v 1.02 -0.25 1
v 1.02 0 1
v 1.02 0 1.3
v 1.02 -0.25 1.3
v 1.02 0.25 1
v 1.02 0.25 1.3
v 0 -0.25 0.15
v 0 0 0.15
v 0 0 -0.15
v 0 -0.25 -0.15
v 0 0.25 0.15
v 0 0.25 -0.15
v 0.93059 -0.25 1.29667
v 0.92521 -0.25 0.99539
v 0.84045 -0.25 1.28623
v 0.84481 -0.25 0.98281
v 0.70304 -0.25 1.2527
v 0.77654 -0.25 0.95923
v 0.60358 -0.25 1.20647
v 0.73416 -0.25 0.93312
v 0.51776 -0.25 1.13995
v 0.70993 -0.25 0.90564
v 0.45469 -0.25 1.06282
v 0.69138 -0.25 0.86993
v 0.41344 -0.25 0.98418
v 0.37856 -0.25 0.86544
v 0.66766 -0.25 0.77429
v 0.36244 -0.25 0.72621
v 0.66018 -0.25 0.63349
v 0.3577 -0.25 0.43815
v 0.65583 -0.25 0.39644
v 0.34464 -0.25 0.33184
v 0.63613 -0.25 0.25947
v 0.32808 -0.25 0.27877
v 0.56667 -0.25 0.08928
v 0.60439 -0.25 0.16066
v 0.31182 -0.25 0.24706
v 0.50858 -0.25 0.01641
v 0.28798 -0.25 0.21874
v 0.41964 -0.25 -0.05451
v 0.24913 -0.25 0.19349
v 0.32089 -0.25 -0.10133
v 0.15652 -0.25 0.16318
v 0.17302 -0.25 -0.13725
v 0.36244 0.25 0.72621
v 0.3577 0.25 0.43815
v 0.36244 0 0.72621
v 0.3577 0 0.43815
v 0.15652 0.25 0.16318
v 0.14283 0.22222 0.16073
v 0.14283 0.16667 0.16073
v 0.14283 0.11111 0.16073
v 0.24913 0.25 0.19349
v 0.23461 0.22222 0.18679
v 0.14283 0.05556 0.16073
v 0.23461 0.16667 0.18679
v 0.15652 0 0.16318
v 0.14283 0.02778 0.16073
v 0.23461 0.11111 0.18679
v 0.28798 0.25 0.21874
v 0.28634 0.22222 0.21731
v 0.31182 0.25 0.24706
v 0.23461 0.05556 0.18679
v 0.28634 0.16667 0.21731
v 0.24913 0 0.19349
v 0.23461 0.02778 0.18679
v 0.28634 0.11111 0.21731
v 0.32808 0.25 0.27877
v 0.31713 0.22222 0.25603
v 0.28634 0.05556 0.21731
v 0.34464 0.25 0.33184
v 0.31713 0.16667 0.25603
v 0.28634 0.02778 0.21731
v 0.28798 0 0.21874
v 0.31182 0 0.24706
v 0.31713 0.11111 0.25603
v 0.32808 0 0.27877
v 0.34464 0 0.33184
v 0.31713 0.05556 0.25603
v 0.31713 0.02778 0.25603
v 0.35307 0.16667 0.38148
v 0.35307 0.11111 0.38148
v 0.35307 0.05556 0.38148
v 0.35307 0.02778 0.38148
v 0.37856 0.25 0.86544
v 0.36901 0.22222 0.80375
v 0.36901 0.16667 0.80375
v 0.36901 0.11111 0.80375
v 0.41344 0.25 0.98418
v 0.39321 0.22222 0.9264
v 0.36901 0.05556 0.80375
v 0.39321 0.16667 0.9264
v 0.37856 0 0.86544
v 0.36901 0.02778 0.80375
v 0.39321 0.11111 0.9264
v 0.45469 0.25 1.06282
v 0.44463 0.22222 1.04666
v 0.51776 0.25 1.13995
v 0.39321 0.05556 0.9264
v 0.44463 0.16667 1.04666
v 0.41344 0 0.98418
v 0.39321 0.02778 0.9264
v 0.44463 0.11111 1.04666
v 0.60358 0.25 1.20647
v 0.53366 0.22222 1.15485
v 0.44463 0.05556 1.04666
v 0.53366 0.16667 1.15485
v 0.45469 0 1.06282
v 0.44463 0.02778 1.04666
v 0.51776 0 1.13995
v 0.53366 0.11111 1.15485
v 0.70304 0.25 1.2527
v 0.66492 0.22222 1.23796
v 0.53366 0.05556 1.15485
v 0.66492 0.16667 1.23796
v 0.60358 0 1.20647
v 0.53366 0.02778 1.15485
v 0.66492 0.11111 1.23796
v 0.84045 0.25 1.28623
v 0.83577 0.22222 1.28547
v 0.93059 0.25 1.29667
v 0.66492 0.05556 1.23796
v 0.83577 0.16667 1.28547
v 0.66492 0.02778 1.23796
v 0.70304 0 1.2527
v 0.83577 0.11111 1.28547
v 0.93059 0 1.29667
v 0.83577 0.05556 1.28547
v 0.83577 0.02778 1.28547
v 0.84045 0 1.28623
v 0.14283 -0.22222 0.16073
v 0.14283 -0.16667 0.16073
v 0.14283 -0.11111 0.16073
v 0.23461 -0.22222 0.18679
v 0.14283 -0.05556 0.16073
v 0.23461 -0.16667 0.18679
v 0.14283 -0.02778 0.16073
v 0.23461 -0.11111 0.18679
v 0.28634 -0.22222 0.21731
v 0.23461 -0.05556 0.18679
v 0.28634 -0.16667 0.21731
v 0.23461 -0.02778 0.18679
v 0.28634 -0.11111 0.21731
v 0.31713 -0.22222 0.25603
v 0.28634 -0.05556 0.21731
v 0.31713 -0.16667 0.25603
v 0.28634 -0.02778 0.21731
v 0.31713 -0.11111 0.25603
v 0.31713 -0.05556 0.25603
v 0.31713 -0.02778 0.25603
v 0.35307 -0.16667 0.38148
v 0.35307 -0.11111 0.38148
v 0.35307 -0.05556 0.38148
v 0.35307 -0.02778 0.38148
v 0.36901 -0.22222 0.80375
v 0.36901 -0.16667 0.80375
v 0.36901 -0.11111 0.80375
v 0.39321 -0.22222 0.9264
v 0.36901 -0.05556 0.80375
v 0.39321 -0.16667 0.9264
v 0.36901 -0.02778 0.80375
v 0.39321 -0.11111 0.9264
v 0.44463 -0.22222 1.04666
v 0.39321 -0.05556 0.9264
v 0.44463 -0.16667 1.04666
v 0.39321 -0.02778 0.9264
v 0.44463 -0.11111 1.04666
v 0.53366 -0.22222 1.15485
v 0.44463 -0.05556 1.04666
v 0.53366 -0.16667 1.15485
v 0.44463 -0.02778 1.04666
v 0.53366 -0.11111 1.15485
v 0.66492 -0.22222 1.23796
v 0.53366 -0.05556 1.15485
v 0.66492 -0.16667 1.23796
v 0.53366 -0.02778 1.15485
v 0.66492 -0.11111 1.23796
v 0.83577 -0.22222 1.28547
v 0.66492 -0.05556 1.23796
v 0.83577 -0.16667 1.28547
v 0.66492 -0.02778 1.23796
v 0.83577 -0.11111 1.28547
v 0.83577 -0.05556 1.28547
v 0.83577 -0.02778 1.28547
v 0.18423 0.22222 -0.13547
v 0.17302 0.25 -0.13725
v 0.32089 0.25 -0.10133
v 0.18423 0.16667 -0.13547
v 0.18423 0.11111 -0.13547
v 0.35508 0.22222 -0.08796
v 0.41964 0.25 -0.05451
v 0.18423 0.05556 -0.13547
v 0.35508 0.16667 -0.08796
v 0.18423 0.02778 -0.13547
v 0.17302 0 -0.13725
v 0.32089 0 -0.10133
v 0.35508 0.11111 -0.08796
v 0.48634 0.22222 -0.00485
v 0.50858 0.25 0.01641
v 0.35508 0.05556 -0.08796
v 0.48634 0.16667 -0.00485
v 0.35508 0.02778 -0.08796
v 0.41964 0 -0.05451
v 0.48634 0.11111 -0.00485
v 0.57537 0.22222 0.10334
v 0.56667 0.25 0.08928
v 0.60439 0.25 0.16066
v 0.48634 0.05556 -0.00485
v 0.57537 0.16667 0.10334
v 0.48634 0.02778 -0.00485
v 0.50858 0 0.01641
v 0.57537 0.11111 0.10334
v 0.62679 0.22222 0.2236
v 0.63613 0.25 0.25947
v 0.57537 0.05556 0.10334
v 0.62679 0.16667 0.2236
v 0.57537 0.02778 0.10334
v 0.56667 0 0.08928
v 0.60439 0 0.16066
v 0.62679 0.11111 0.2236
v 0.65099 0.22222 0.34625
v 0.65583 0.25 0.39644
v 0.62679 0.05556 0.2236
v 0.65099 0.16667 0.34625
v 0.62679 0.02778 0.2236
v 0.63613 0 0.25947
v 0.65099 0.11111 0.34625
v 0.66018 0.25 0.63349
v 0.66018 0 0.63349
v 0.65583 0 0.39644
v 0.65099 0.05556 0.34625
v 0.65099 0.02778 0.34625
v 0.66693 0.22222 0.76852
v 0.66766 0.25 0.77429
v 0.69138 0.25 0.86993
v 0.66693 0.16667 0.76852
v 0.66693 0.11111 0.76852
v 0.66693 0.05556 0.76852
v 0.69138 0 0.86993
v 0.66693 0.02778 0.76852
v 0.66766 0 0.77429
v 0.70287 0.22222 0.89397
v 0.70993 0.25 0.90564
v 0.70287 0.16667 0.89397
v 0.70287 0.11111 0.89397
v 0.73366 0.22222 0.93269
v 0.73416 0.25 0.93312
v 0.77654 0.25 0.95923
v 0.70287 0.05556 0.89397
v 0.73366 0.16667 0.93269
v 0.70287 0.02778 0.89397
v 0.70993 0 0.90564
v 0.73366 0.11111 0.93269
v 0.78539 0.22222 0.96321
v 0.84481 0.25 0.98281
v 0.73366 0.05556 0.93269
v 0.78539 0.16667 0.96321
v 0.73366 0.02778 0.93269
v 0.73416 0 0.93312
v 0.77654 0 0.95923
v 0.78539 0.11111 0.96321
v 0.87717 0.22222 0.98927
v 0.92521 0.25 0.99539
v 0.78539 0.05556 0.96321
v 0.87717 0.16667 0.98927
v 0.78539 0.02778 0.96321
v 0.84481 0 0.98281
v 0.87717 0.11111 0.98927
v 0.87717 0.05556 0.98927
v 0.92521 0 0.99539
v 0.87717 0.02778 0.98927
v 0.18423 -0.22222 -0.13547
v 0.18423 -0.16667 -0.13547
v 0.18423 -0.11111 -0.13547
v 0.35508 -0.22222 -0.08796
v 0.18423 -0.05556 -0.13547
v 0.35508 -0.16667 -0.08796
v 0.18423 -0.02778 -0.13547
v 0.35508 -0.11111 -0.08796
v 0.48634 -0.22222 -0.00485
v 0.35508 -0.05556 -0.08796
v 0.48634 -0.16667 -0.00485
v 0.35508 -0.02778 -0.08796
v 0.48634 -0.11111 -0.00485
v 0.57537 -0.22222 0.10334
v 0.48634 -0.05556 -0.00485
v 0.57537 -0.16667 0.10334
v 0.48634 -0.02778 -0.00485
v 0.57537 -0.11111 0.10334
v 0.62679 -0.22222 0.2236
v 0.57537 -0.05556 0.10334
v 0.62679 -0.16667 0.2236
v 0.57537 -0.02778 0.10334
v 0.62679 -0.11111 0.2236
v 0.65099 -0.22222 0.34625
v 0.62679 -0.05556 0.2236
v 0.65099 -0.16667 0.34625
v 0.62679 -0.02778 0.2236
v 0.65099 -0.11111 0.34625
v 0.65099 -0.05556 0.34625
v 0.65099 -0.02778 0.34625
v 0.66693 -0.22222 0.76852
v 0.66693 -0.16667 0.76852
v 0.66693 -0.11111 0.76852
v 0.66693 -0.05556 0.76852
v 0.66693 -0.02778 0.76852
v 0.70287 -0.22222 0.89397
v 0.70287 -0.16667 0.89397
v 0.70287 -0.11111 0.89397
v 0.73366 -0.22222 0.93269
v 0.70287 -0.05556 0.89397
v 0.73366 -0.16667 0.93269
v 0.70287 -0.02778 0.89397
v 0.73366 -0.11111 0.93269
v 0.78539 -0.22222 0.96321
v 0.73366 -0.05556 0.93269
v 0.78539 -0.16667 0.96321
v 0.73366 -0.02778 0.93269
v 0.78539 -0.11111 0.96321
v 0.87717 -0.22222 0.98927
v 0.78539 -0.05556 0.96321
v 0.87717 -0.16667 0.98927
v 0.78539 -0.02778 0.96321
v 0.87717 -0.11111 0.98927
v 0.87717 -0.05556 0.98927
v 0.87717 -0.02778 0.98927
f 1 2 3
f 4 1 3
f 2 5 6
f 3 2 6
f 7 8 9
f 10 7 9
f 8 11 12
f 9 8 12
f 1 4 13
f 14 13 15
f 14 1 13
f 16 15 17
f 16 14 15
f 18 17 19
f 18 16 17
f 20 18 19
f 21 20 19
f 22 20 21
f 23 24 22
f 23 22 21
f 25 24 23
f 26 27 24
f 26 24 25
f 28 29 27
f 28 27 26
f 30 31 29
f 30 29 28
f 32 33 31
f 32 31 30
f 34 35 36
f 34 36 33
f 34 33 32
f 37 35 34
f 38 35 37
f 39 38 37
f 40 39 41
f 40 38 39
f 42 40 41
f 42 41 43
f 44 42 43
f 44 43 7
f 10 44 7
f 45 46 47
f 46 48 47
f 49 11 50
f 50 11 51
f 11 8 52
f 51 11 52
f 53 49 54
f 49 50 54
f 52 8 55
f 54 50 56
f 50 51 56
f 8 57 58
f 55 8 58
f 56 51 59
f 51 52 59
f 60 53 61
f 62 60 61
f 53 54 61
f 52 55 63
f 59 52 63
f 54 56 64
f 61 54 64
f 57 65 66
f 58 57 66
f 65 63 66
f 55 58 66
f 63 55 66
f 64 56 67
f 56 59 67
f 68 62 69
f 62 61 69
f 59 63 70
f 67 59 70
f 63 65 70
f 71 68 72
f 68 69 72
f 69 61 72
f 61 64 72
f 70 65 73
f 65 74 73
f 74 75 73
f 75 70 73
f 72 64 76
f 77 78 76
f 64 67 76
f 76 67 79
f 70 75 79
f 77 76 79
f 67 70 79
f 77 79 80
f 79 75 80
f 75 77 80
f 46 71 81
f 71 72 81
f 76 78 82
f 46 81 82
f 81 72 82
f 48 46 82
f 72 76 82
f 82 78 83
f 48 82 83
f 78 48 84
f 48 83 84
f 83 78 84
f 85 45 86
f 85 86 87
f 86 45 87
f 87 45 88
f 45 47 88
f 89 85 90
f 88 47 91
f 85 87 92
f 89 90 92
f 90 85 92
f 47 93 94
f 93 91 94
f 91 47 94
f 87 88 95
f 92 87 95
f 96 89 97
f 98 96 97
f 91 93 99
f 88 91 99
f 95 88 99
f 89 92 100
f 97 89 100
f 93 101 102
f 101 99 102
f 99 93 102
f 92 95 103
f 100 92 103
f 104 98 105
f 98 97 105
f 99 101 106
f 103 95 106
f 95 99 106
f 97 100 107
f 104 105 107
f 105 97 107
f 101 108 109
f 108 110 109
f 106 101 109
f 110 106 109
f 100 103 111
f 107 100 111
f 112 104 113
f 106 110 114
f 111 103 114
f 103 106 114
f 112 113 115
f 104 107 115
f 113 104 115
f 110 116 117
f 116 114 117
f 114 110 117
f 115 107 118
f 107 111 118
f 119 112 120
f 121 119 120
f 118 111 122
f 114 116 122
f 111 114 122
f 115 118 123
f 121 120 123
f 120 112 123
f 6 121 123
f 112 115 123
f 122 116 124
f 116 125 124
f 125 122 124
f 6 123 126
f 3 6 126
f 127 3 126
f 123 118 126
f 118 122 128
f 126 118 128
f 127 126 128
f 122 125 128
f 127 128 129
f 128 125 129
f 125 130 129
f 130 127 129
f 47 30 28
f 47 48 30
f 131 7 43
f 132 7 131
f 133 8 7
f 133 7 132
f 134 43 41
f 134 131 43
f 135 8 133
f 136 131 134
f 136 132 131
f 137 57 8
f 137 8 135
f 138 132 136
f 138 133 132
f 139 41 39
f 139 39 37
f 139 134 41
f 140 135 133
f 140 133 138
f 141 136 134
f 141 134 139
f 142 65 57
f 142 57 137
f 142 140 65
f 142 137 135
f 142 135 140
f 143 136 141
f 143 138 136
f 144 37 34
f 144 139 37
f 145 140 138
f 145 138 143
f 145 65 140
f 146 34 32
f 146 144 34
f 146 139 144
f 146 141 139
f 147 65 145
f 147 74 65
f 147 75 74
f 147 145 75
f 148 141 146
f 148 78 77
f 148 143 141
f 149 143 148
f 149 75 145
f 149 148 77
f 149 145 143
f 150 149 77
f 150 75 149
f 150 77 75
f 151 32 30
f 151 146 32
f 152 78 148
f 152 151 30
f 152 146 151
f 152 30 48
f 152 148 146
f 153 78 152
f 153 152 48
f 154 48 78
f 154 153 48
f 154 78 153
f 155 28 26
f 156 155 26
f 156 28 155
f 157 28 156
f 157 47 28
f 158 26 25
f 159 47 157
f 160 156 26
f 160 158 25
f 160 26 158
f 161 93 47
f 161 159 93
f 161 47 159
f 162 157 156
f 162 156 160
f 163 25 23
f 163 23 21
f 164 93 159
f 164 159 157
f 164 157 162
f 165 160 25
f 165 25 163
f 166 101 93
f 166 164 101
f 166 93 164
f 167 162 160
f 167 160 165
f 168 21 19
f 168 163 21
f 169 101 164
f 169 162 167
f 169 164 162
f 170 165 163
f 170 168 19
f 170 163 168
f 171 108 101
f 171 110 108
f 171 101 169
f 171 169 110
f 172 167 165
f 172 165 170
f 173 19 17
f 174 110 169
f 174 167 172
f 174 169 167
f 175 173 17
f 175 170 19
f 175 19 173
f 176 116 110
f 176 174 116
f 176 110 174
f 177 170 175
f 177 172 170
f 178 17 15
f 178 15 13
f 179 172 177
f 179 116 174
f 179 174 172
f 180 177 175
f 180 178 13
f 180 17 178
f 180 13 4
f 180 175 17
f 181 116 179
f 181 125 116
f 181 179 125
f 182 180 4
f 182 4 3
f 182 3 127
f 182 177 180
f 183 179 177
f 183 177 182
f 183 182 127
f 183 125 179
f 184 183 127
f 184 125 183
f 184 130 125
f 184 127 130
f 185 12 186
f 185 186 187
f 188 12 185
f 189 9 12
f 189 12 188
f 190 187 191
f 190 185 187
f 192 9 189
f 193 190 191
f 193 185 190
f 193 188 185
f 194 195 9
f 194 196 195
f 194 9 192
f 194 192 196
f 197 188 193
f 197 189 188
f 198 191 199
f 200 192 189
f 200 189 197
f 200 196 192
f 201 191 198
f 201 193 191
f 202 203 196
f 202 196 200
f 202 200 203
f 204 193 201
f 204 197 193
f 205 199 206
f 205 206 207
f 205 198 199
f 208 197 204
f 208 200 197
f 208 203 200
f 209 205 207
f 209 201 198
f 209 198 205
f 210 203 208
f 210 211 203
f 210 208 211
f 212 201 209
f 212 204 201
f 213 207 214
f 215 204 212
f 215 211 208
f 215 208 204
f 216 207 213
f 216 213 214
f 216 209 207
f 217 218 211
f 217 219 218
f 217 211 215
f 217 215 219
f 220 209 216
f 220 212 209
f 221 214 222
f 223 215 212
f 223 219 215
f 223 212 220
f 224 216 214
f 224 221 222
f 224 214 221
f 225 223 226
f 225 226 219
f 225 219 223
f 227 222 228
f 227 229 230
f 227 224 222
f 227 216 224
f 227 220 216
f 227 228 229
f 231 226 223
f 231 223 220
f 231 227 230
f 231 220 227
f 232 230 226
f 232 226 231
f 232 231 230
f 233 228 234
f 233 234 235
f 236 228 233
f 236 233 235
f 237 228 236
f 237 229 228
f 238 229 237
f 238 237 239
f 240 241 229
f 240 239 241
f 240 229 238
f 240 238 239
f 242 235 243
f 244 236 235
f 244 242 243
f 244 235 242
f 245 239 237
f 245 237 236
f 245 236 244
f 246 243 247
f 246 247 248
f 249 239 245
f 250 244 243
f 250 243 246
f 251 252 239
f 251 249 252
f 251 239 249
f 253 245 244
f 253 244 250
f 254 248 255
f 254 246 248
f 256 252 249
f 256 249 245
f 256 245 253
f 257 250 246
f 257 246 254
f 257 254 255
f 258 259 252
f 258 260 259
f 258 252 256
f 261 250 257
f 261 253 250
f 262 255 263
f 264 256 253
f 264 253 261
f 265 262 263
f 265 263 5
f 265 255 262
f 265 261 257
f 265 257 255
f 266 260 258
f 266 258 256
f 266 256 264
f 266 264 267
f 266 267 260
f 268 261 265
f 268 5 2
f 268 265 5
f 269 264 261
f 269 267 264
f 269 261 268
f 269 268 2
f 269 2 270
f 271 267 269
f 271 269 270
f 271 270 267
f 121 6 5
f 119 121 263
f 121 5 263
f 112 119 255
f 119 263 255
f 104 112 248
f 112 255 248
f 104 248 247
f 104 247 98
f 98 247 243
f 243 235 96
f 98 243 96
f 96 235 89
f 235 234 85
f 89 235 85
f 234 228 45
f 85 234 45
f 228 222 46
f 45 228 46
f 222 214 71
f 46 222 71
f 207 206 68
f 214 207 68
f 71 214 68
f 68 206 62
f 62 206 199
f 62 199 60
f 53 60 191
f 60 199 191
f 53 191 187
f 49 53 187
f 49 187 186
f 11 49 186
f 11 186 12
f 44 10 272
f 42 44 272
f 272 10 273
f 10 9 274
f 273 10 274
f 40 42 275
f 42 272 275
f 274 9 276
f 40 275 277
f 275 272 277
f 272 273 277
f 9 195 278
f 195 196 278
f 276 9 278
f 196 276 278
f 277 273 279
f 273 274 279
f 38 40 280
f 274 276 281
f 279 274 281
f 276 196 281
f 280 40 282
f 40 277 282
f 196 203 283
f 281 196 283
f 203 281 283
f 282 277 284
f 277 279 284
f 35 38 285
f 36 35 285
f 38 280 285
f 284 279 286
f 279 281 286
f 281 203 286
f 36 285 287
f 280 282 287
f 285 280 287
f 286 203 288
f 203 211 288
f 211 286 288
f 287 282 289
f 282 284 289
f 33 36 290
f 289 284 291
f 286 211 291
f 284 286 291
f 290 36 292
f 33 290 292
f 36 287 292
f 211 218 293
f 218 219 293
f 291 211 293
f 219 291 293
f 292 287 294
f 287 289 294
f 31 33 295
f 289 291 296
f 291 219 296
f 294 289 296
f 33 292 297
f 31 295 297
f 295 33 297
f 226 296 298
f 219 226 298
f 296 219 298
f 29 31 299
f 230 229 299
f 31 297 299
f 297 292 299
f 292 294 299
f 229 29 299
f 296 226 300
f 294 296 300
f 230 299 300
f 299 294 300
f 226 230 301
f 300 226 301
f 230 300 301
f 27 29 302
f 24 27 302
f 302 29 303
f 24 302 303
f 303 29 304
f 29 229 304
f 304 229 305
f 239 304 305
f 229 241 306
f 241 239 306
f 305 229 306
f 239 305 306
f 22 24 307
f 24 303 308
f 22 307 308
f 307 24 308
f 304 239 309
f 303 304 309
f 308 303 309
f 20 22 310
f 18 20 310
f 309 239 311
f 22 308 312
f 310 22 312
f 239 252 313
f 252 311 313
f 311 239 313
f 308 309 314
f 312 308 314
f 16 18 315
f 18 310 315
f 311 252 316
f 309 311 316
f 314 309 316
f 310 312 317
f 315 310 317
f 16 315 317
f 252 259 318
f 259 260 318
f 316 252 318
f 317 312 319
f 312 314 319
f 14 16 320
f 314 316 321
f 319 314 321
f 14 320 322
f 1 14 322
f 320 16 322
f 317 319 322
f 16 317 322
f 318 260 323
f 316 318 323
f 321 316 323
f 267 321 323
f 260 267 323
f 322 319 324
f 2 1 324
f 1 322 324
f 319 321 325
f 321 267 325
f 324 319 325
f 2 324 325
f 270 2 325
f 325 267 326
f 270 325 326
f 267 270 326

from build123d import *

# Parameters (mm, degrees)
BOSS_EXTRUDE1_DEPTH = 0.25


with BuildPart() as part:
    # Sketch1 → Boss-Extrude1 (new body, symmetric)
    with BuildSketch(Plane(origin=(0, 0, 0), x_dir=(1, 0, 0), z_dir=(0, 1, 0))):
        with BuildLine():
            Line((0, -0.15), (0, 0.15))
            add(Edge.make_bspline(
                [(0, 0.15), (0.120151792, 0.15), (0.385384773, 0.113888838), (0.601384368, -0.095842467), (0.661277487, -0.350560649), (0.659464905, -0.579419842), (0.660862894, -0.781759984), (0.69866774, -0.904638876), (0.751166188, -0.953669974), (0.864334193, -0.992097665), (0.97225533, -1), (1.02, -1)],
                knots=[0, 0, 0, 0, 0.125, 0.25, 0.375, 0.5, 0.625, 0.75, 0.875, 0.9375, 1, 1, 1, 1], degree=3))
            Line((1.02, -1), (1.02, -1.3))
            add(Edge.make_bspline(
                [(0, -0.15), (0.04774467, -0.15), (0.155665807, -0.157902335), (0.268833812, -0.196330026), (0.32133226, -0.245361124), (0.359137106, -0.368240016), (0.360535095, -0.570580158), (0.358722513, -0.799439351), (0.418615632, -1.054157533), (0.634615227, -1.263888838), (0.899848208, -1.3), (1.02, -1.3)],
                knots=[0, 0, 0, 0, 0.0625, 0.125, 0.25, 0.375, 0.5, 0.625, 0.75, 0.875, 1, 1, 1, 1], degree=3))
        make_face()
    extrude(amount=BOSS_EXTRUDE1_DEPTH, both=True)


solid = part.part
